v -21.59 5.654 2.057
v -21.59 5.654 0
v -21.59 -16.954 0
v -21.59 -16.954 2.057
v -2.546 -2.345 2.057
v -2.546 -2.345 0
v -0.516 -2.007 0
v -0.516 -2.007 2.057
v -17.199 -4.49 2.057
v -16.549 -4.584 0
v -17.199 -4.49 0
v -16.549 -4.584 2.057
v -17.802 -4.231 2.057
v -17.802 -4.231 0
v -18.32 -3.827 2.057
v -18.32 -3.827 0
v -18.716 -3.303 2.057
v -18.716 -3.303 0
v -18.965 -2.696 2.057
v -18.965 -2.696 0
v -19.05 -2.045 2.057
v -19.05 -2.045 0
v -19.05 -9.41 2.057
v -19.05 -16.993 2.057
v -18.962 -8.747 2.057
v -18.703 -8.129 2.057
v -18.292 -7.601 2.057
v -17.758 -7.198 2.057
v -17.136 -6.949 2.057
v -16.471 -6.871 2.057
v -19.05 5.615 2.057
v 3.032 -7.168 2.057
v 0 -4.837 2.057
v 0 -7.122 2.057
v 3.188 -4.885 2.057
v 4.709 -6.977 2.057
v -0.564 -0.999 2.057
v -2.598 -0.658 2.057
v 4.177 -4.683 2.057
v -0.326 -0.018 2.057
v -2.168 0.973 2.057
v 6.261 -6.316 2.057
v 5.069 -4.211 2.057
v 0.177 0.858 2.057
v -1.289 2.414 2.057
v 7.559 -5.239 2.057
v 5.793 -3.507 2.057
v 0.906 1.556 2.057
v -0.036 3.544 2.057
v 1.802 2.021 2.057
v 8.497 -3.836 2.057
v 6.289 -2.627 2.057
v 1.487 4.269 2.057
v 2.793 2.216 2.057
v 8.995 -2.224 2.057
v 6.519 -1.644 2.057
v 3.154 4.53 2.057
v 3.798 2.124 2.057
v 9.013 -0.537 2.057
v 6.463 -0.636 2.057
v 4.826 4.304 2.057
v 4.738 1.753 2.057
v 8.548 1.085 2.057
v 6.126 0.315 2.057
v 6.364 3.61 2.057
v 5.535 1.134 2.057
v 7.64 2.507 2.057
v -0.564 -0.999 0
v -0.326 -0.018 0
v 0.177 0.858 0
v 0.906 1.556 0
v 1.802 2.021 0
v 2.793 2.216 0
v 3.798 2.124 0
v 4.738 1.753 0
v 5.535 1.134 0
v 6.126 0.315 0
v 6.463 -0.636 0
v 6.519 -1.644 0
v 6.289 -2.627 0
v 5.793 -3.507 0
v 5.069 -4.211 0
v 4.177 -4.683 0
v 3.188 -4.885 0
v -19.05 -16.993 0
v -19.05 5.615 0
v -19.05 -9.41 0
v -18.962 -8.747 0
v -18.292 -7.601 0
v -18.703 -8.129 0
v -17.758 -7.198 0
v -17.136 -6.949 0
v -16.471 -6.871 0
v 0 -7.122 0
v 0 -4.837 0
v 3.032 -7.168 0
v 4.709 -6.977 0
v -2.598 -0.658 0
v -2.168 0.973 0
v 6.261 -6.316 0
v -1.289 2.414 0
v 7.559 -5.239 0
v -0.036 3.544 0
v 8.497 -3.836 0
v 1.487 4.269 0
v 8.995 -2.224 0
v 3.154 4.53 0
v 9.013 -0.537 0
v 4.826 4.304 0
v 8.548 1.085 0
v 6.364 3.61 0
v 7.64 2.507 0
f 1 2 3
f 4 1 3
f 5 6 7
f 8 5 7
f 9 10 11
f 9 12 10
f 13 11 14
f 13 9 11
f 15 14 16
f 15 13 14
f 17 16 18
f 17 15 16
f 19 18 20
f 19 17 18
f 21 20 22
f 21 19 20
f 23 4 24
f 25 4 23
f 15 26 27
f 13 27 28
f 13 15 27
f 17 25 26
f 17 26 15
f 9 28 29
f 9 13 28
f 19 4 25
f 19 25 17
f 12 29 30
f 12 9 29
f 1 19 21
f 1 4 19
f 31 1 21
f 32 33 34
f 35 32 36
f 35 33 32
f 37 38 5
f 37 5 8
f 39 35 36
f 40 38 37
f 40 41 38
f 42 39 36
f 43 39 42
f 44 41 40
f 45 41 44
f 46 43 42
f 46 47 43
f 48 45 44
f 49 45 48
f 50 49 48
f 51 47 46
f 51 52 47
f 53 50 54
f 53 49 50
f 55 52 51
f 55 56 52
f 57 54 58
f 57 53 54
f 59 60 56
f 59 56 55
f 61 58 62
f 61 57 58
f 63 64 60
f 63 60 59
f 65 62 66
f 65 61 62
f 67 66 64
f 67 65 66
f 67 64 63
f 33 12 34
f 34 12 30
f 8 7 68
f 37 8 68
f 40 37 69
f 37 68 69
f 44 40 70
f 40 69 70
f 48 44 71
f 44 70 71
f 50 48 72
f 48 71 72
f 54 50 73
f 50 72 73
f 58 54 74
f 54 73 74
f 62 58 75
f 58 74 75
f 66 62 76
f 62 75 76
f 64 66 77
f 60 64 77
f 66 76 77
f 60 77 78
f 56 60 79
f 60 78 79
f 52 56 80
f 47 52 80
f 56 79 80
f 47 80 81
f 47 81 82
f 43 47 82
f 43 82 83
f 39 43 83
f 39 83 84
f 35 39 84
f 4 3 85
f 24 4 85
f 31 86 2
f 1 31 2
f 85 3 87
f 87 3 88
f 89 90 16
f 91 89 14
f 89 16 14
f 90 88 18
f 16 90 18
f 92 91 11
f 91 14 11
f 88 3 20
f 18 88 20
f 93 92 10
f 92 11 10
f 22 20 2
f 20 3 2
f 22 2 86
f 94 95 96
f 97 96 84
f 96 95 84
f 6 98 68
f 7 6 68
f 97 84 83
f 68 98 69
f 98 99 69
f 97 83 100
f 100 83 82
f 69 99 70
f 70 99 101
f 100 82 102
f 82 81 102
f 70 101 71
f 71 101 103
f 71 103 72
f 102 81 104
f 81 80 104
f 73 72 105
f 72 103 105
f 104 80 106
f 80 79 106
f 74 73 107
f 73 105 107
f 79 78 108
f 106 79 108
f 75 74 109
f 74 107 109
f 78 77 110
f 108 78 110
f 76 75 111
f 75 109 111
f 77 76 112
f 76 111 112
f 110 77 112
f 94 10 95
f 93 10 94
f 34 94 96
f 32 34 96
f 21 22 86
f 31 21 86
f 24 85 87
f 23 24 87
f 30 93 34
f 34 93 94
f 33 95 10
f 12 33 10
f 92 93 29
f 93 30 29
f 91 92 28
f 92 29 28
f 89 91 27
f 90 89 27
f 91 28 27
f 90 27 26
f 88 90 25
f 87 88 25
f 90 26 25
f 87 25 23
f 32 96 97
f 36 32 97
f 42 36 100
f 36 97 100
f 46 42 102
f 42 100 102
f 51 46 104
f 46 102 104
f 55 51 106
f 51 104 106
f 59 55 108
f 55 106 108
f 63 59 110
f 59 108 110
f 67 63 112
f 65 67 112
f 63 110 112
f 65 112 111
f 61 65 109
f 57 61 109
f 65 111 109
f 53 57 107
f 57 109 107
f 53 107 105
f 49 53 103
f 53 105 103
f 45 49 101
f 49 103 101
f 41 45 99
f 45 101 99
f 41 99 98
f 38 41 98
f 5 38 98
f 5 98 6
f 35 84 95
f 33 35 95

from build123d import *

# Parameters (mm, degrees)
F1_DEPTH = 2.0574
F2_R     = 2.54


with BuildPart() as f1:
    # F0 (on Top) → F1 (new body)
    with BuildSketch(Plane.XY):
        Polygon((-19.05, -6.831449), (0, -7.122084), (0, -4.836785), (-19.05, -4.546149), (-19.05, 5.615033), (-21.59, 5.653784), (-21.59, -16.95388), (-19.05, -16.992631), align=None)
        with BuildLine():
            Line((0, -7.122084), (3.032153, -7.168344))
            ThreePointArc((3.032153, -7.168344), (7.041994, 3.104817), (-2.545553, -2.344551))
            Line((-2.545553, -2.344551), (-0.515844, -2.007228))
            ThreePointArc((-0.515844, -2.007228), (5.158216, 1.472099), (3.187775, -4.885419))
            Line((3.187775, -4.885419), (0, -4.836785))
            Line((0, -4.836785), (0, -7.122084))
        make_face()
    extrude(amount=F1_DEPTH)

    # F2
    f2_edges = [f1.edges().sort_by_distance(p)[0] for p in [
        (-19.05, -6.831449, 1.0287),
        (-19.05, -4.546149, 1.0287),
    ]]
    fillet(f2_edges, radius=F2_R)


solid = f1.part
